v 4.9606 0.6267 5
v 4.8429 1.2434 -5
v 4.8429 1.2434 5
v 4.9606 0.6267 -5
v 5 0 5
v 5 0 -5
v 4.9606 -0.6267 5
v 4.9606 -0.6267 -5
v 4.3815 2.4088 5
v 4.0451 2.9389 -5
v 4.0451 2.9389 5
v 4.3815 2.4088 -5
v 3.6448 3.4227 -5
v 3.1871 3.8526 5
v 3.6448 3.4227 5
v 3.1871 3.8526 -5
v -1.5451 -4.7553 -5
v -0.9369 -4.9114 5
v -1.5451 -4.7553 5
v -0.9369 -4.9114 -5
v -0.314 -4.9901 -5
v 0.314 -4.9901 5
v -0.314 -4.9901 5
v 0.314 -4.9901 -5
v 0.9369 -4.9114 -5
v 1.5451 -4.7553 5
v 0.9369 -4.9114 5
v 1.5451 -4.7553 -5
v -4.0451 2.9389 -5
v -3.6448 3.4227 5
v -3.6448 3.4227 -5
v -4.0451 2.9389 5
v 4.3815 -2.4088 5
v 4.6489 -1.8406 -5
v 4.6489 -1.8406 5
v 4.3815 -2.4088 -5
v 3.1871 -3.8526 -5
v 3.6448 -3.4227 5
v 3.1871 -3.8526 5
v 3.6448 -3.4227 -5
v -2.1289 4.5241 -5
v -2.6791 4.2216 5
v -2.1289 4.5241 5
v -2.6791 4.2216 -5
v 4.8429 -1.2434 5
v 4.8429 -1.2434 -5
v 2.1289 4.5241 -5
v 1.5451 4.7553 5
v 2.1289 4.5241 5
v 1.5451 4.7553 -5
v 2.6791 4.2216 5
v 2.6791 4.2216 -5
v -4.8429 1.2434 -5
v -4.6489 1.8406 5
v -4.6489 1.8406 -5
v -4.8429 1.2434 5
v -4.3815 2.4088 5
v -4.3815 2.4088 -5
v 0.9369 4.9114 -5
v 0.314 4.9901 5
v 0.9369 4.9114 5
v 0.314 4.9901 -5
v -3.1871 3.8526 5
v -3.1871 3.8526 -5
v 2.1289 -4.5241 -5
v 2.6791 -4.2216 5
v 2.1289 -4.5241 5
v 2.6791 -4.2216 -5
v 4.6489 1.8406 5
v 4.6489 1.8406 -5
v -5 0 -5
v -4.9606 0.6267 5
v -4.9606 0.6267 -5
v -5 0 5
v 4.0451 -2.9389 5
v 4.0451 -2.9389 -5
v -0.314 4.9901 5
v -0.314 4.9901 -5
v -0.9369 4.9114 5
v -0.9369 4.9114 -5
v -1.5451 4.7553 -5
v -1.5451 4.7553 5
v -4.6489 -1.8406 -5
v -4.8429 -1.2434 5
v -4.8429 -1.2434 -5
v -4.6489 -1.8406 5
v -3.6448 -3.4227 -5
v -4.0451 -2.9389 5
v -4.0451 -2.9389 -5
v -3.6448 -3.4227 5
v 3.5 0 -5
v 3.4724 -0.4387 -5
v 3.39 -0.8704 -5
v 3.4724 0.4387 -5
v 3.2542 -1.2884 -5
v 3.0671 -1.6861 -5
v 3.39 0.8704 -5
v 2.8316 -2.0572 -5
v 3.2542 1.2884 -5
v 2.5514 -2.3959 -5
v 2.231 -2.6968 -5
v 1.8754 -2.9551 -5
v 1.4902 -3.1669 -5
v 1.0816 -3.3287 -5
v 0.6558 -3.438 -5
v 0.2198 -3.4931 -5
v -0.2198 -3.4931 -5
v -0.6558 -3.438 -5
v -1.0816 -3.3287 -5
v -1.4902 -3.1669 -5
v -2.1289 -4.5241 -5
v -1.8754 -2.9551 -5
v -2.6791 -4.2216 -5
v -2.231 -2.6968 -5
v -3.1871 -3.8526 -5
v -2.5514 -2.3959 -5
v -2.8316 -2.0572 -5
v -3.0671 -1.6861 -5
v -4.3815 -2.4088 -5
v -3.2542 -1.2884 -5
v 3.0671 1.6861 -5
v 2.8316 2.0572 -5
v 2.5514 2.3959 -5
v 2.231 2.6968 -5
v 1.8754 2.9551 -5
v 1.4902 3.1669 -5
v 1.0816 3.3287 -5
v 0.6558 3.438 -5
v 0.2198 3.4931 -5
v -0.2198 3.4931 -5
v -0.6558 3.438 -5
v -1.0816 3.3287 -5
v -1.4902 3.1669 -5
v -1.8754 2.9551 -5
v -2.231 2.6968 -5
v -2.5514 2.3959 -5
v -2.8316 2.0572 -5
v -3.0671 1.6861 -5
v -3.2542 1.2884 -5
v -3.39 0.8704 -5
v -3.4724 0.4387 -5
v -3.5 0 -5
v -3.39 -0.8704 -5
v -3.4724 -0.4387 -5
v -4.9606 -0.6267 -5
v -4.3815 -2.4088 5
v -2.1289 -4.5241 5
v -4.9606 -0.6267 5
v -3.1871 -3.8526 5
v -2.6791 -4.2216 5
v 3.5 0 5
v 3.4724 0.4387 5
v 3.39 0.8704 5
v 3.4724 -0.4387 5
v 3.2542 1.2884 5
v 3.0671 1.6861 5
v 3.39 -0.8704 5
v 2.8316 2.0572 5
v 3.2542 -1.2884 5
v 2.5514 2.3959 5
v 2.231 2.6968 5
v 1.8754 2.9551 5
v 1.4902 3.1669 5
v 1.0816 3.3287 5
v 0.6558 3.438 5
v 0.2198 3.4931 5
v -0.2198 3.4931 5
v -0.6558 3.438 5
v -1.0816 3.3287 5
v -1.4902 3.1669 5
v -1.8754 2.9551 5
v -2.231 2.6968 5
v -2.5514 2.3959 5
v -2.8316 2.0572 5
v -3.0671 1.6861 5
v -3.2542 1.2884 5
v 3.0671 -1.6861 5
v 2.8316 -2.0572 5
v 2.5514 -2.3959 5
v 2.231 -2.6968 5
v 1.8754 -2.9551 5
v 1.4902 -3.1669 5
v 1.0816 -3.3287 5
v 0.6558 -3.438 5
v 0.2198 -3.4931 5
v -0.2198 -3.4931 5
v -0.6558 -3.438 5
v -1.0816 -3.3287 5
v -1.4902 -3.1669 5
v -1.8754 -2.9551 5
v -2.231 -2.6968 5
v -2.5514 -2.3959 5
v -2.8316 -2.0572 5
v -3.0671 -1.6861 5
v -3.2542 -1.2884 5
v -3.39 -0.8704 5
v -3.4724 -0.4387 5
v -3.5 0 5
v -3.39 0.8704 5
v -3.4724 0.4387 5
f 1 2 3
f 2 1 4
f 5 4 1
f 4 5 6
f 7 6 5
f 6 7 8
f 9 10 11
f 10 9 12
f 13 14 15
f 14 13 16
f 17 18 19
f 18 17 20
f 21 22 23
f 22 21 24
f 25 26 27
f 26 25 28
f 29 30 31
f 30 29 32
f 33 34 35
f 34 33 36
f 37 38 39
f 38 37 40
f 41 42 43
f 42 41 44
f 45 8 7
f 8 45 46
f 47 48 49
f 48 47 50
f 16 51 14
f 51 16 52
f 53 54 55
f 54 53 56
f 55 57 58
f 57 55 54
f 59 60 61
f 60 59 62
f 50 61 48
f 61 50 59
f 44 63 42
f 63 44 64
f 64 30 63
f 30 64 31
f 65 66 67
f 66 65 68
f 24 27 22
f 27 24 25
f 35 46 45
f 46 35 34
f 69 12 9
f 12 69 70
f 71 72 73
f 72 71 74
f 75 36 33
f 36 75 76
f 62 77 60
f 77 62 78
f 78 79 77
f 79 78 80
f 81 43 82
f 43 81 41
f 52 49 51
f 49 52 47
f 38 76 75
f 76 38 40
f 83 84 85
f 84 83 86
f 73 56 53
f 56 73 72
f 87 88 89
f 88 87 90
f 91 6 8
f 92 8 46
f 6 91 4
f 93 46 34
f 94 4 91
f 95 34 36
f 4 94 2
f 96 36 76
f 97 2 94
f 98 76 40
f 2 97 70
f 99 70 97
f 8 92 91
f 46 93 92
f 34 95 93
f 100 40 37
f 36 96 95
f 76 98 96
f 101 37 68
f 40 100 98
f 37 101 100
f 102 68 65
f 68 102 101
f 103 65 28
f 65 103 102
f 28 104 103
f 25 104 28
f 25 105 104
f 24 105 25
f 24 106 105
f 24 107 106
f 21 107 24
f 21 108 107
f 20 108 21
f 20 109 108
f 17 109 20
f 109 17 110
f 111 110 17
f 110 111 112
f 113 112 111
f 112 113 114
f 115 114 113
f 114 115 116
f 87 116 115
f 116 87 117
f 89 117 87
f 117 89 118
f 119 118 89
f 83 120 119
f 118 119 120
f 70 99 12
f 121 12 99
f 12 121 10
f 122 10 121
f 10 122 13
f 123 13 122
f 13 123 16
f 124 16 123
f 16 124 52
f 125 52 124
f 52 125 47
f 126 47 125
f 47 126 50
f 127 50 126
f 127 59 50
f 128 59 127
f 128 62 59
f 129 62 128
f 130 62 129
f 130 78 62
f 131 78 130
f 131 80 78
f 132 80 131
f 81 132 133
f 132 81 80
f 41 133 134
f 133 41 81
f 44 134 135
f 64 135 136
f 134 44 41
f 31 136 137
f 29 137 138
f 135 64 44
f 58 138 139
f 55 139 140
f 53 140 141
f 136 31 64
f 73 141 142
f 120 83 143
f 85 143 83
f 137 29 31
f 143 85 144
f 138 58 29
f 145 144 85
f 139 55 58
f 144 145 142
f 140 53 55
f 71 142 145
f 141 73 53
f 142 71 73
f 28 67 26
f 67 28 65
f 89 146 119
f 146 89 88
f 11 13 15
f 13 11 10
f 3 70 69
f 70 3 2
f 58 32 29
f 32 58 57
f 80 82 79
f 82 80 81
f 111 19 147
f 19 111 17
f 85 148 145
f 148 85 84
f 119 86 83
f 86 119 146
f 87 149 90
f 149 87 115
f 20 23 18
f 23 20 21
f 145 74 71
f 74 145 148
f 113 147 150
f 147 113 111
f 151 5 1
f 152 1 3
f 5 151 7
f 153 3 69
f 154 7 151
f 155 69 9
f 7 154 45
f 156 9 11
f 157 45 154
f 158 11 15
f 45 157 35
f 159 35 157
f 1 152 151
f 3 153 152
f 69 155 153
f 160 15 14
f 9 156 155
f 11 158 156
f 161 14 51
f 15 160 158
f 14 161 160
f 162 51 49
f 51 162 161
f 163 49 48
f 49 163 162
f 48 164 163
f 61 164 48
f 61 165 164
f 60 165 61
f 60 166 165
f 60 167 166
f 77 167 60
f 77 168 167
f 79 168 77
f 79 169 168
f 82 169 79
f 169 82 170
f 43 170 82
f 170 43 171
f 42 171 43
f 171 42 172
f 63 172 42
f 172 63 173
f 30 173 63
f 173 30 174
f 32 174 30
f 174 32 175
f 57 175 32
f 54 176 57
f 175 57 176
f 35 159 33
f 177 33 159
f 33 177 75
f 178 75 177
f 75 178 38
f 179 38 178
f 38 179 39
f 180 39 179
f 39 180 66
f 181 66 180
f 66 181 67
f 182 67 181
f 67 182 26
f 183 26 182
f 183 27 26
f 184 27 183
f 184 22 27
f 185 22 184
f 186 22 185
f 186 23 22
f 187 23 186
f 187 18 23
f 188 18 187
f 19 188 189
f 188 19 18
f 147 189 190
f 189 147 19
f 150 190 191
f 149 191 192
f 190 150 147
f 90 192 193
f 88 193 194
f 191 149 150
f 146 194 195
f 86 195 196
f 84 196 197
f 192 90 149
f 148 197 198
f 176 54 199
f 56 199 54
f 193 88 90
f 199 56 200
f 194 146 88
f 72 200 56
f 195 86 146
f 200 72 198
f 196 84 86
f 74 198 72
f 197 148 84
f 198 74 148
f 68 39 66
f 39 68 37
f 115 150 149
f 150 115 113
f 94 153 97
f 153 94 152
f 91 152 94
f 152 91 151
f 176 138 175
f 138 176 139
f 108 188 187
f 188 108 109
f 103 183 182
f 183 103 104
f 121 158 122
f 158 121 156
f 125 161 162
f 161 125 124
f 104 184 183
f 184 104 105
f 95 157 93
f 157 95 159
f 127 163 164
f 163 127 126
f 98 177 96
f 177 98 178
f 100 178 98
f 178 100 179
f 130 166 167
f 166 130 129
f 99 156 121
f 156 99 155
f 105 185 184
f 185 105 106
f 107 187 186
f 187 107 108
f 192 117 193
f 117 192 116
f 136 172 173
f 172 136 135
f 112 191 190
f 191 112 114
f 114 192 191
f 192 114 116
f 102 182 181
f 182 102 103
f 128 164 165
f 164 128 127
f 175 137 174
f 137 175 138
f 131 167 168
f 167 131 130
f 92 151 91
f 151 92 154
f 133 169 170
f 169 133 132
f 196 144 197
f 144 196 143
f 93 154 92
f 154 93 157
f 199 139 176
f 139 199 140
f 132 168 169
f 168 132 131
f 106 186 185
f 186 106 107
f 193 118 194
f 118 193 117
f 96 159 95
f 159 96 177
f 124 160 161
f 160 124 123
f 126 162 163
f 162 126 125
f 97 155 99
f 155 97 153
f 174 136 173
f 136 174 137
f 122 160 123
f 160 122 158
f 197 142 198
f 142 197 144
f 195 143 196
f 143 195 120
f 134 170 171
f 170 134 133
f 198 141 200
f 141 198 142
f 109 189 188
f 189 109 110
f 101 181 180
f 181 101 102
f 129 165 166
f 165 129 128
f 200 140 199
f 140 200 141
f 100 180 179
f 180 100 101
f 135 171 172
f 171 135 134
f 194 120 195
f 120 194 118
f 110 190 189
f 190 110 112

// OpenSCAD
$fn = 50;


difference() {
	union() {
		translate(v = [0, 0, -5.0000000000]) {
			cylinder(h = 10, r = 5.0000000000);
		}
	}
	union() {
		translate(v = [0, 0, -100.0000000000]) {
			cylinder(h = 200, r = 3.5000000000);
		}
	}
}
